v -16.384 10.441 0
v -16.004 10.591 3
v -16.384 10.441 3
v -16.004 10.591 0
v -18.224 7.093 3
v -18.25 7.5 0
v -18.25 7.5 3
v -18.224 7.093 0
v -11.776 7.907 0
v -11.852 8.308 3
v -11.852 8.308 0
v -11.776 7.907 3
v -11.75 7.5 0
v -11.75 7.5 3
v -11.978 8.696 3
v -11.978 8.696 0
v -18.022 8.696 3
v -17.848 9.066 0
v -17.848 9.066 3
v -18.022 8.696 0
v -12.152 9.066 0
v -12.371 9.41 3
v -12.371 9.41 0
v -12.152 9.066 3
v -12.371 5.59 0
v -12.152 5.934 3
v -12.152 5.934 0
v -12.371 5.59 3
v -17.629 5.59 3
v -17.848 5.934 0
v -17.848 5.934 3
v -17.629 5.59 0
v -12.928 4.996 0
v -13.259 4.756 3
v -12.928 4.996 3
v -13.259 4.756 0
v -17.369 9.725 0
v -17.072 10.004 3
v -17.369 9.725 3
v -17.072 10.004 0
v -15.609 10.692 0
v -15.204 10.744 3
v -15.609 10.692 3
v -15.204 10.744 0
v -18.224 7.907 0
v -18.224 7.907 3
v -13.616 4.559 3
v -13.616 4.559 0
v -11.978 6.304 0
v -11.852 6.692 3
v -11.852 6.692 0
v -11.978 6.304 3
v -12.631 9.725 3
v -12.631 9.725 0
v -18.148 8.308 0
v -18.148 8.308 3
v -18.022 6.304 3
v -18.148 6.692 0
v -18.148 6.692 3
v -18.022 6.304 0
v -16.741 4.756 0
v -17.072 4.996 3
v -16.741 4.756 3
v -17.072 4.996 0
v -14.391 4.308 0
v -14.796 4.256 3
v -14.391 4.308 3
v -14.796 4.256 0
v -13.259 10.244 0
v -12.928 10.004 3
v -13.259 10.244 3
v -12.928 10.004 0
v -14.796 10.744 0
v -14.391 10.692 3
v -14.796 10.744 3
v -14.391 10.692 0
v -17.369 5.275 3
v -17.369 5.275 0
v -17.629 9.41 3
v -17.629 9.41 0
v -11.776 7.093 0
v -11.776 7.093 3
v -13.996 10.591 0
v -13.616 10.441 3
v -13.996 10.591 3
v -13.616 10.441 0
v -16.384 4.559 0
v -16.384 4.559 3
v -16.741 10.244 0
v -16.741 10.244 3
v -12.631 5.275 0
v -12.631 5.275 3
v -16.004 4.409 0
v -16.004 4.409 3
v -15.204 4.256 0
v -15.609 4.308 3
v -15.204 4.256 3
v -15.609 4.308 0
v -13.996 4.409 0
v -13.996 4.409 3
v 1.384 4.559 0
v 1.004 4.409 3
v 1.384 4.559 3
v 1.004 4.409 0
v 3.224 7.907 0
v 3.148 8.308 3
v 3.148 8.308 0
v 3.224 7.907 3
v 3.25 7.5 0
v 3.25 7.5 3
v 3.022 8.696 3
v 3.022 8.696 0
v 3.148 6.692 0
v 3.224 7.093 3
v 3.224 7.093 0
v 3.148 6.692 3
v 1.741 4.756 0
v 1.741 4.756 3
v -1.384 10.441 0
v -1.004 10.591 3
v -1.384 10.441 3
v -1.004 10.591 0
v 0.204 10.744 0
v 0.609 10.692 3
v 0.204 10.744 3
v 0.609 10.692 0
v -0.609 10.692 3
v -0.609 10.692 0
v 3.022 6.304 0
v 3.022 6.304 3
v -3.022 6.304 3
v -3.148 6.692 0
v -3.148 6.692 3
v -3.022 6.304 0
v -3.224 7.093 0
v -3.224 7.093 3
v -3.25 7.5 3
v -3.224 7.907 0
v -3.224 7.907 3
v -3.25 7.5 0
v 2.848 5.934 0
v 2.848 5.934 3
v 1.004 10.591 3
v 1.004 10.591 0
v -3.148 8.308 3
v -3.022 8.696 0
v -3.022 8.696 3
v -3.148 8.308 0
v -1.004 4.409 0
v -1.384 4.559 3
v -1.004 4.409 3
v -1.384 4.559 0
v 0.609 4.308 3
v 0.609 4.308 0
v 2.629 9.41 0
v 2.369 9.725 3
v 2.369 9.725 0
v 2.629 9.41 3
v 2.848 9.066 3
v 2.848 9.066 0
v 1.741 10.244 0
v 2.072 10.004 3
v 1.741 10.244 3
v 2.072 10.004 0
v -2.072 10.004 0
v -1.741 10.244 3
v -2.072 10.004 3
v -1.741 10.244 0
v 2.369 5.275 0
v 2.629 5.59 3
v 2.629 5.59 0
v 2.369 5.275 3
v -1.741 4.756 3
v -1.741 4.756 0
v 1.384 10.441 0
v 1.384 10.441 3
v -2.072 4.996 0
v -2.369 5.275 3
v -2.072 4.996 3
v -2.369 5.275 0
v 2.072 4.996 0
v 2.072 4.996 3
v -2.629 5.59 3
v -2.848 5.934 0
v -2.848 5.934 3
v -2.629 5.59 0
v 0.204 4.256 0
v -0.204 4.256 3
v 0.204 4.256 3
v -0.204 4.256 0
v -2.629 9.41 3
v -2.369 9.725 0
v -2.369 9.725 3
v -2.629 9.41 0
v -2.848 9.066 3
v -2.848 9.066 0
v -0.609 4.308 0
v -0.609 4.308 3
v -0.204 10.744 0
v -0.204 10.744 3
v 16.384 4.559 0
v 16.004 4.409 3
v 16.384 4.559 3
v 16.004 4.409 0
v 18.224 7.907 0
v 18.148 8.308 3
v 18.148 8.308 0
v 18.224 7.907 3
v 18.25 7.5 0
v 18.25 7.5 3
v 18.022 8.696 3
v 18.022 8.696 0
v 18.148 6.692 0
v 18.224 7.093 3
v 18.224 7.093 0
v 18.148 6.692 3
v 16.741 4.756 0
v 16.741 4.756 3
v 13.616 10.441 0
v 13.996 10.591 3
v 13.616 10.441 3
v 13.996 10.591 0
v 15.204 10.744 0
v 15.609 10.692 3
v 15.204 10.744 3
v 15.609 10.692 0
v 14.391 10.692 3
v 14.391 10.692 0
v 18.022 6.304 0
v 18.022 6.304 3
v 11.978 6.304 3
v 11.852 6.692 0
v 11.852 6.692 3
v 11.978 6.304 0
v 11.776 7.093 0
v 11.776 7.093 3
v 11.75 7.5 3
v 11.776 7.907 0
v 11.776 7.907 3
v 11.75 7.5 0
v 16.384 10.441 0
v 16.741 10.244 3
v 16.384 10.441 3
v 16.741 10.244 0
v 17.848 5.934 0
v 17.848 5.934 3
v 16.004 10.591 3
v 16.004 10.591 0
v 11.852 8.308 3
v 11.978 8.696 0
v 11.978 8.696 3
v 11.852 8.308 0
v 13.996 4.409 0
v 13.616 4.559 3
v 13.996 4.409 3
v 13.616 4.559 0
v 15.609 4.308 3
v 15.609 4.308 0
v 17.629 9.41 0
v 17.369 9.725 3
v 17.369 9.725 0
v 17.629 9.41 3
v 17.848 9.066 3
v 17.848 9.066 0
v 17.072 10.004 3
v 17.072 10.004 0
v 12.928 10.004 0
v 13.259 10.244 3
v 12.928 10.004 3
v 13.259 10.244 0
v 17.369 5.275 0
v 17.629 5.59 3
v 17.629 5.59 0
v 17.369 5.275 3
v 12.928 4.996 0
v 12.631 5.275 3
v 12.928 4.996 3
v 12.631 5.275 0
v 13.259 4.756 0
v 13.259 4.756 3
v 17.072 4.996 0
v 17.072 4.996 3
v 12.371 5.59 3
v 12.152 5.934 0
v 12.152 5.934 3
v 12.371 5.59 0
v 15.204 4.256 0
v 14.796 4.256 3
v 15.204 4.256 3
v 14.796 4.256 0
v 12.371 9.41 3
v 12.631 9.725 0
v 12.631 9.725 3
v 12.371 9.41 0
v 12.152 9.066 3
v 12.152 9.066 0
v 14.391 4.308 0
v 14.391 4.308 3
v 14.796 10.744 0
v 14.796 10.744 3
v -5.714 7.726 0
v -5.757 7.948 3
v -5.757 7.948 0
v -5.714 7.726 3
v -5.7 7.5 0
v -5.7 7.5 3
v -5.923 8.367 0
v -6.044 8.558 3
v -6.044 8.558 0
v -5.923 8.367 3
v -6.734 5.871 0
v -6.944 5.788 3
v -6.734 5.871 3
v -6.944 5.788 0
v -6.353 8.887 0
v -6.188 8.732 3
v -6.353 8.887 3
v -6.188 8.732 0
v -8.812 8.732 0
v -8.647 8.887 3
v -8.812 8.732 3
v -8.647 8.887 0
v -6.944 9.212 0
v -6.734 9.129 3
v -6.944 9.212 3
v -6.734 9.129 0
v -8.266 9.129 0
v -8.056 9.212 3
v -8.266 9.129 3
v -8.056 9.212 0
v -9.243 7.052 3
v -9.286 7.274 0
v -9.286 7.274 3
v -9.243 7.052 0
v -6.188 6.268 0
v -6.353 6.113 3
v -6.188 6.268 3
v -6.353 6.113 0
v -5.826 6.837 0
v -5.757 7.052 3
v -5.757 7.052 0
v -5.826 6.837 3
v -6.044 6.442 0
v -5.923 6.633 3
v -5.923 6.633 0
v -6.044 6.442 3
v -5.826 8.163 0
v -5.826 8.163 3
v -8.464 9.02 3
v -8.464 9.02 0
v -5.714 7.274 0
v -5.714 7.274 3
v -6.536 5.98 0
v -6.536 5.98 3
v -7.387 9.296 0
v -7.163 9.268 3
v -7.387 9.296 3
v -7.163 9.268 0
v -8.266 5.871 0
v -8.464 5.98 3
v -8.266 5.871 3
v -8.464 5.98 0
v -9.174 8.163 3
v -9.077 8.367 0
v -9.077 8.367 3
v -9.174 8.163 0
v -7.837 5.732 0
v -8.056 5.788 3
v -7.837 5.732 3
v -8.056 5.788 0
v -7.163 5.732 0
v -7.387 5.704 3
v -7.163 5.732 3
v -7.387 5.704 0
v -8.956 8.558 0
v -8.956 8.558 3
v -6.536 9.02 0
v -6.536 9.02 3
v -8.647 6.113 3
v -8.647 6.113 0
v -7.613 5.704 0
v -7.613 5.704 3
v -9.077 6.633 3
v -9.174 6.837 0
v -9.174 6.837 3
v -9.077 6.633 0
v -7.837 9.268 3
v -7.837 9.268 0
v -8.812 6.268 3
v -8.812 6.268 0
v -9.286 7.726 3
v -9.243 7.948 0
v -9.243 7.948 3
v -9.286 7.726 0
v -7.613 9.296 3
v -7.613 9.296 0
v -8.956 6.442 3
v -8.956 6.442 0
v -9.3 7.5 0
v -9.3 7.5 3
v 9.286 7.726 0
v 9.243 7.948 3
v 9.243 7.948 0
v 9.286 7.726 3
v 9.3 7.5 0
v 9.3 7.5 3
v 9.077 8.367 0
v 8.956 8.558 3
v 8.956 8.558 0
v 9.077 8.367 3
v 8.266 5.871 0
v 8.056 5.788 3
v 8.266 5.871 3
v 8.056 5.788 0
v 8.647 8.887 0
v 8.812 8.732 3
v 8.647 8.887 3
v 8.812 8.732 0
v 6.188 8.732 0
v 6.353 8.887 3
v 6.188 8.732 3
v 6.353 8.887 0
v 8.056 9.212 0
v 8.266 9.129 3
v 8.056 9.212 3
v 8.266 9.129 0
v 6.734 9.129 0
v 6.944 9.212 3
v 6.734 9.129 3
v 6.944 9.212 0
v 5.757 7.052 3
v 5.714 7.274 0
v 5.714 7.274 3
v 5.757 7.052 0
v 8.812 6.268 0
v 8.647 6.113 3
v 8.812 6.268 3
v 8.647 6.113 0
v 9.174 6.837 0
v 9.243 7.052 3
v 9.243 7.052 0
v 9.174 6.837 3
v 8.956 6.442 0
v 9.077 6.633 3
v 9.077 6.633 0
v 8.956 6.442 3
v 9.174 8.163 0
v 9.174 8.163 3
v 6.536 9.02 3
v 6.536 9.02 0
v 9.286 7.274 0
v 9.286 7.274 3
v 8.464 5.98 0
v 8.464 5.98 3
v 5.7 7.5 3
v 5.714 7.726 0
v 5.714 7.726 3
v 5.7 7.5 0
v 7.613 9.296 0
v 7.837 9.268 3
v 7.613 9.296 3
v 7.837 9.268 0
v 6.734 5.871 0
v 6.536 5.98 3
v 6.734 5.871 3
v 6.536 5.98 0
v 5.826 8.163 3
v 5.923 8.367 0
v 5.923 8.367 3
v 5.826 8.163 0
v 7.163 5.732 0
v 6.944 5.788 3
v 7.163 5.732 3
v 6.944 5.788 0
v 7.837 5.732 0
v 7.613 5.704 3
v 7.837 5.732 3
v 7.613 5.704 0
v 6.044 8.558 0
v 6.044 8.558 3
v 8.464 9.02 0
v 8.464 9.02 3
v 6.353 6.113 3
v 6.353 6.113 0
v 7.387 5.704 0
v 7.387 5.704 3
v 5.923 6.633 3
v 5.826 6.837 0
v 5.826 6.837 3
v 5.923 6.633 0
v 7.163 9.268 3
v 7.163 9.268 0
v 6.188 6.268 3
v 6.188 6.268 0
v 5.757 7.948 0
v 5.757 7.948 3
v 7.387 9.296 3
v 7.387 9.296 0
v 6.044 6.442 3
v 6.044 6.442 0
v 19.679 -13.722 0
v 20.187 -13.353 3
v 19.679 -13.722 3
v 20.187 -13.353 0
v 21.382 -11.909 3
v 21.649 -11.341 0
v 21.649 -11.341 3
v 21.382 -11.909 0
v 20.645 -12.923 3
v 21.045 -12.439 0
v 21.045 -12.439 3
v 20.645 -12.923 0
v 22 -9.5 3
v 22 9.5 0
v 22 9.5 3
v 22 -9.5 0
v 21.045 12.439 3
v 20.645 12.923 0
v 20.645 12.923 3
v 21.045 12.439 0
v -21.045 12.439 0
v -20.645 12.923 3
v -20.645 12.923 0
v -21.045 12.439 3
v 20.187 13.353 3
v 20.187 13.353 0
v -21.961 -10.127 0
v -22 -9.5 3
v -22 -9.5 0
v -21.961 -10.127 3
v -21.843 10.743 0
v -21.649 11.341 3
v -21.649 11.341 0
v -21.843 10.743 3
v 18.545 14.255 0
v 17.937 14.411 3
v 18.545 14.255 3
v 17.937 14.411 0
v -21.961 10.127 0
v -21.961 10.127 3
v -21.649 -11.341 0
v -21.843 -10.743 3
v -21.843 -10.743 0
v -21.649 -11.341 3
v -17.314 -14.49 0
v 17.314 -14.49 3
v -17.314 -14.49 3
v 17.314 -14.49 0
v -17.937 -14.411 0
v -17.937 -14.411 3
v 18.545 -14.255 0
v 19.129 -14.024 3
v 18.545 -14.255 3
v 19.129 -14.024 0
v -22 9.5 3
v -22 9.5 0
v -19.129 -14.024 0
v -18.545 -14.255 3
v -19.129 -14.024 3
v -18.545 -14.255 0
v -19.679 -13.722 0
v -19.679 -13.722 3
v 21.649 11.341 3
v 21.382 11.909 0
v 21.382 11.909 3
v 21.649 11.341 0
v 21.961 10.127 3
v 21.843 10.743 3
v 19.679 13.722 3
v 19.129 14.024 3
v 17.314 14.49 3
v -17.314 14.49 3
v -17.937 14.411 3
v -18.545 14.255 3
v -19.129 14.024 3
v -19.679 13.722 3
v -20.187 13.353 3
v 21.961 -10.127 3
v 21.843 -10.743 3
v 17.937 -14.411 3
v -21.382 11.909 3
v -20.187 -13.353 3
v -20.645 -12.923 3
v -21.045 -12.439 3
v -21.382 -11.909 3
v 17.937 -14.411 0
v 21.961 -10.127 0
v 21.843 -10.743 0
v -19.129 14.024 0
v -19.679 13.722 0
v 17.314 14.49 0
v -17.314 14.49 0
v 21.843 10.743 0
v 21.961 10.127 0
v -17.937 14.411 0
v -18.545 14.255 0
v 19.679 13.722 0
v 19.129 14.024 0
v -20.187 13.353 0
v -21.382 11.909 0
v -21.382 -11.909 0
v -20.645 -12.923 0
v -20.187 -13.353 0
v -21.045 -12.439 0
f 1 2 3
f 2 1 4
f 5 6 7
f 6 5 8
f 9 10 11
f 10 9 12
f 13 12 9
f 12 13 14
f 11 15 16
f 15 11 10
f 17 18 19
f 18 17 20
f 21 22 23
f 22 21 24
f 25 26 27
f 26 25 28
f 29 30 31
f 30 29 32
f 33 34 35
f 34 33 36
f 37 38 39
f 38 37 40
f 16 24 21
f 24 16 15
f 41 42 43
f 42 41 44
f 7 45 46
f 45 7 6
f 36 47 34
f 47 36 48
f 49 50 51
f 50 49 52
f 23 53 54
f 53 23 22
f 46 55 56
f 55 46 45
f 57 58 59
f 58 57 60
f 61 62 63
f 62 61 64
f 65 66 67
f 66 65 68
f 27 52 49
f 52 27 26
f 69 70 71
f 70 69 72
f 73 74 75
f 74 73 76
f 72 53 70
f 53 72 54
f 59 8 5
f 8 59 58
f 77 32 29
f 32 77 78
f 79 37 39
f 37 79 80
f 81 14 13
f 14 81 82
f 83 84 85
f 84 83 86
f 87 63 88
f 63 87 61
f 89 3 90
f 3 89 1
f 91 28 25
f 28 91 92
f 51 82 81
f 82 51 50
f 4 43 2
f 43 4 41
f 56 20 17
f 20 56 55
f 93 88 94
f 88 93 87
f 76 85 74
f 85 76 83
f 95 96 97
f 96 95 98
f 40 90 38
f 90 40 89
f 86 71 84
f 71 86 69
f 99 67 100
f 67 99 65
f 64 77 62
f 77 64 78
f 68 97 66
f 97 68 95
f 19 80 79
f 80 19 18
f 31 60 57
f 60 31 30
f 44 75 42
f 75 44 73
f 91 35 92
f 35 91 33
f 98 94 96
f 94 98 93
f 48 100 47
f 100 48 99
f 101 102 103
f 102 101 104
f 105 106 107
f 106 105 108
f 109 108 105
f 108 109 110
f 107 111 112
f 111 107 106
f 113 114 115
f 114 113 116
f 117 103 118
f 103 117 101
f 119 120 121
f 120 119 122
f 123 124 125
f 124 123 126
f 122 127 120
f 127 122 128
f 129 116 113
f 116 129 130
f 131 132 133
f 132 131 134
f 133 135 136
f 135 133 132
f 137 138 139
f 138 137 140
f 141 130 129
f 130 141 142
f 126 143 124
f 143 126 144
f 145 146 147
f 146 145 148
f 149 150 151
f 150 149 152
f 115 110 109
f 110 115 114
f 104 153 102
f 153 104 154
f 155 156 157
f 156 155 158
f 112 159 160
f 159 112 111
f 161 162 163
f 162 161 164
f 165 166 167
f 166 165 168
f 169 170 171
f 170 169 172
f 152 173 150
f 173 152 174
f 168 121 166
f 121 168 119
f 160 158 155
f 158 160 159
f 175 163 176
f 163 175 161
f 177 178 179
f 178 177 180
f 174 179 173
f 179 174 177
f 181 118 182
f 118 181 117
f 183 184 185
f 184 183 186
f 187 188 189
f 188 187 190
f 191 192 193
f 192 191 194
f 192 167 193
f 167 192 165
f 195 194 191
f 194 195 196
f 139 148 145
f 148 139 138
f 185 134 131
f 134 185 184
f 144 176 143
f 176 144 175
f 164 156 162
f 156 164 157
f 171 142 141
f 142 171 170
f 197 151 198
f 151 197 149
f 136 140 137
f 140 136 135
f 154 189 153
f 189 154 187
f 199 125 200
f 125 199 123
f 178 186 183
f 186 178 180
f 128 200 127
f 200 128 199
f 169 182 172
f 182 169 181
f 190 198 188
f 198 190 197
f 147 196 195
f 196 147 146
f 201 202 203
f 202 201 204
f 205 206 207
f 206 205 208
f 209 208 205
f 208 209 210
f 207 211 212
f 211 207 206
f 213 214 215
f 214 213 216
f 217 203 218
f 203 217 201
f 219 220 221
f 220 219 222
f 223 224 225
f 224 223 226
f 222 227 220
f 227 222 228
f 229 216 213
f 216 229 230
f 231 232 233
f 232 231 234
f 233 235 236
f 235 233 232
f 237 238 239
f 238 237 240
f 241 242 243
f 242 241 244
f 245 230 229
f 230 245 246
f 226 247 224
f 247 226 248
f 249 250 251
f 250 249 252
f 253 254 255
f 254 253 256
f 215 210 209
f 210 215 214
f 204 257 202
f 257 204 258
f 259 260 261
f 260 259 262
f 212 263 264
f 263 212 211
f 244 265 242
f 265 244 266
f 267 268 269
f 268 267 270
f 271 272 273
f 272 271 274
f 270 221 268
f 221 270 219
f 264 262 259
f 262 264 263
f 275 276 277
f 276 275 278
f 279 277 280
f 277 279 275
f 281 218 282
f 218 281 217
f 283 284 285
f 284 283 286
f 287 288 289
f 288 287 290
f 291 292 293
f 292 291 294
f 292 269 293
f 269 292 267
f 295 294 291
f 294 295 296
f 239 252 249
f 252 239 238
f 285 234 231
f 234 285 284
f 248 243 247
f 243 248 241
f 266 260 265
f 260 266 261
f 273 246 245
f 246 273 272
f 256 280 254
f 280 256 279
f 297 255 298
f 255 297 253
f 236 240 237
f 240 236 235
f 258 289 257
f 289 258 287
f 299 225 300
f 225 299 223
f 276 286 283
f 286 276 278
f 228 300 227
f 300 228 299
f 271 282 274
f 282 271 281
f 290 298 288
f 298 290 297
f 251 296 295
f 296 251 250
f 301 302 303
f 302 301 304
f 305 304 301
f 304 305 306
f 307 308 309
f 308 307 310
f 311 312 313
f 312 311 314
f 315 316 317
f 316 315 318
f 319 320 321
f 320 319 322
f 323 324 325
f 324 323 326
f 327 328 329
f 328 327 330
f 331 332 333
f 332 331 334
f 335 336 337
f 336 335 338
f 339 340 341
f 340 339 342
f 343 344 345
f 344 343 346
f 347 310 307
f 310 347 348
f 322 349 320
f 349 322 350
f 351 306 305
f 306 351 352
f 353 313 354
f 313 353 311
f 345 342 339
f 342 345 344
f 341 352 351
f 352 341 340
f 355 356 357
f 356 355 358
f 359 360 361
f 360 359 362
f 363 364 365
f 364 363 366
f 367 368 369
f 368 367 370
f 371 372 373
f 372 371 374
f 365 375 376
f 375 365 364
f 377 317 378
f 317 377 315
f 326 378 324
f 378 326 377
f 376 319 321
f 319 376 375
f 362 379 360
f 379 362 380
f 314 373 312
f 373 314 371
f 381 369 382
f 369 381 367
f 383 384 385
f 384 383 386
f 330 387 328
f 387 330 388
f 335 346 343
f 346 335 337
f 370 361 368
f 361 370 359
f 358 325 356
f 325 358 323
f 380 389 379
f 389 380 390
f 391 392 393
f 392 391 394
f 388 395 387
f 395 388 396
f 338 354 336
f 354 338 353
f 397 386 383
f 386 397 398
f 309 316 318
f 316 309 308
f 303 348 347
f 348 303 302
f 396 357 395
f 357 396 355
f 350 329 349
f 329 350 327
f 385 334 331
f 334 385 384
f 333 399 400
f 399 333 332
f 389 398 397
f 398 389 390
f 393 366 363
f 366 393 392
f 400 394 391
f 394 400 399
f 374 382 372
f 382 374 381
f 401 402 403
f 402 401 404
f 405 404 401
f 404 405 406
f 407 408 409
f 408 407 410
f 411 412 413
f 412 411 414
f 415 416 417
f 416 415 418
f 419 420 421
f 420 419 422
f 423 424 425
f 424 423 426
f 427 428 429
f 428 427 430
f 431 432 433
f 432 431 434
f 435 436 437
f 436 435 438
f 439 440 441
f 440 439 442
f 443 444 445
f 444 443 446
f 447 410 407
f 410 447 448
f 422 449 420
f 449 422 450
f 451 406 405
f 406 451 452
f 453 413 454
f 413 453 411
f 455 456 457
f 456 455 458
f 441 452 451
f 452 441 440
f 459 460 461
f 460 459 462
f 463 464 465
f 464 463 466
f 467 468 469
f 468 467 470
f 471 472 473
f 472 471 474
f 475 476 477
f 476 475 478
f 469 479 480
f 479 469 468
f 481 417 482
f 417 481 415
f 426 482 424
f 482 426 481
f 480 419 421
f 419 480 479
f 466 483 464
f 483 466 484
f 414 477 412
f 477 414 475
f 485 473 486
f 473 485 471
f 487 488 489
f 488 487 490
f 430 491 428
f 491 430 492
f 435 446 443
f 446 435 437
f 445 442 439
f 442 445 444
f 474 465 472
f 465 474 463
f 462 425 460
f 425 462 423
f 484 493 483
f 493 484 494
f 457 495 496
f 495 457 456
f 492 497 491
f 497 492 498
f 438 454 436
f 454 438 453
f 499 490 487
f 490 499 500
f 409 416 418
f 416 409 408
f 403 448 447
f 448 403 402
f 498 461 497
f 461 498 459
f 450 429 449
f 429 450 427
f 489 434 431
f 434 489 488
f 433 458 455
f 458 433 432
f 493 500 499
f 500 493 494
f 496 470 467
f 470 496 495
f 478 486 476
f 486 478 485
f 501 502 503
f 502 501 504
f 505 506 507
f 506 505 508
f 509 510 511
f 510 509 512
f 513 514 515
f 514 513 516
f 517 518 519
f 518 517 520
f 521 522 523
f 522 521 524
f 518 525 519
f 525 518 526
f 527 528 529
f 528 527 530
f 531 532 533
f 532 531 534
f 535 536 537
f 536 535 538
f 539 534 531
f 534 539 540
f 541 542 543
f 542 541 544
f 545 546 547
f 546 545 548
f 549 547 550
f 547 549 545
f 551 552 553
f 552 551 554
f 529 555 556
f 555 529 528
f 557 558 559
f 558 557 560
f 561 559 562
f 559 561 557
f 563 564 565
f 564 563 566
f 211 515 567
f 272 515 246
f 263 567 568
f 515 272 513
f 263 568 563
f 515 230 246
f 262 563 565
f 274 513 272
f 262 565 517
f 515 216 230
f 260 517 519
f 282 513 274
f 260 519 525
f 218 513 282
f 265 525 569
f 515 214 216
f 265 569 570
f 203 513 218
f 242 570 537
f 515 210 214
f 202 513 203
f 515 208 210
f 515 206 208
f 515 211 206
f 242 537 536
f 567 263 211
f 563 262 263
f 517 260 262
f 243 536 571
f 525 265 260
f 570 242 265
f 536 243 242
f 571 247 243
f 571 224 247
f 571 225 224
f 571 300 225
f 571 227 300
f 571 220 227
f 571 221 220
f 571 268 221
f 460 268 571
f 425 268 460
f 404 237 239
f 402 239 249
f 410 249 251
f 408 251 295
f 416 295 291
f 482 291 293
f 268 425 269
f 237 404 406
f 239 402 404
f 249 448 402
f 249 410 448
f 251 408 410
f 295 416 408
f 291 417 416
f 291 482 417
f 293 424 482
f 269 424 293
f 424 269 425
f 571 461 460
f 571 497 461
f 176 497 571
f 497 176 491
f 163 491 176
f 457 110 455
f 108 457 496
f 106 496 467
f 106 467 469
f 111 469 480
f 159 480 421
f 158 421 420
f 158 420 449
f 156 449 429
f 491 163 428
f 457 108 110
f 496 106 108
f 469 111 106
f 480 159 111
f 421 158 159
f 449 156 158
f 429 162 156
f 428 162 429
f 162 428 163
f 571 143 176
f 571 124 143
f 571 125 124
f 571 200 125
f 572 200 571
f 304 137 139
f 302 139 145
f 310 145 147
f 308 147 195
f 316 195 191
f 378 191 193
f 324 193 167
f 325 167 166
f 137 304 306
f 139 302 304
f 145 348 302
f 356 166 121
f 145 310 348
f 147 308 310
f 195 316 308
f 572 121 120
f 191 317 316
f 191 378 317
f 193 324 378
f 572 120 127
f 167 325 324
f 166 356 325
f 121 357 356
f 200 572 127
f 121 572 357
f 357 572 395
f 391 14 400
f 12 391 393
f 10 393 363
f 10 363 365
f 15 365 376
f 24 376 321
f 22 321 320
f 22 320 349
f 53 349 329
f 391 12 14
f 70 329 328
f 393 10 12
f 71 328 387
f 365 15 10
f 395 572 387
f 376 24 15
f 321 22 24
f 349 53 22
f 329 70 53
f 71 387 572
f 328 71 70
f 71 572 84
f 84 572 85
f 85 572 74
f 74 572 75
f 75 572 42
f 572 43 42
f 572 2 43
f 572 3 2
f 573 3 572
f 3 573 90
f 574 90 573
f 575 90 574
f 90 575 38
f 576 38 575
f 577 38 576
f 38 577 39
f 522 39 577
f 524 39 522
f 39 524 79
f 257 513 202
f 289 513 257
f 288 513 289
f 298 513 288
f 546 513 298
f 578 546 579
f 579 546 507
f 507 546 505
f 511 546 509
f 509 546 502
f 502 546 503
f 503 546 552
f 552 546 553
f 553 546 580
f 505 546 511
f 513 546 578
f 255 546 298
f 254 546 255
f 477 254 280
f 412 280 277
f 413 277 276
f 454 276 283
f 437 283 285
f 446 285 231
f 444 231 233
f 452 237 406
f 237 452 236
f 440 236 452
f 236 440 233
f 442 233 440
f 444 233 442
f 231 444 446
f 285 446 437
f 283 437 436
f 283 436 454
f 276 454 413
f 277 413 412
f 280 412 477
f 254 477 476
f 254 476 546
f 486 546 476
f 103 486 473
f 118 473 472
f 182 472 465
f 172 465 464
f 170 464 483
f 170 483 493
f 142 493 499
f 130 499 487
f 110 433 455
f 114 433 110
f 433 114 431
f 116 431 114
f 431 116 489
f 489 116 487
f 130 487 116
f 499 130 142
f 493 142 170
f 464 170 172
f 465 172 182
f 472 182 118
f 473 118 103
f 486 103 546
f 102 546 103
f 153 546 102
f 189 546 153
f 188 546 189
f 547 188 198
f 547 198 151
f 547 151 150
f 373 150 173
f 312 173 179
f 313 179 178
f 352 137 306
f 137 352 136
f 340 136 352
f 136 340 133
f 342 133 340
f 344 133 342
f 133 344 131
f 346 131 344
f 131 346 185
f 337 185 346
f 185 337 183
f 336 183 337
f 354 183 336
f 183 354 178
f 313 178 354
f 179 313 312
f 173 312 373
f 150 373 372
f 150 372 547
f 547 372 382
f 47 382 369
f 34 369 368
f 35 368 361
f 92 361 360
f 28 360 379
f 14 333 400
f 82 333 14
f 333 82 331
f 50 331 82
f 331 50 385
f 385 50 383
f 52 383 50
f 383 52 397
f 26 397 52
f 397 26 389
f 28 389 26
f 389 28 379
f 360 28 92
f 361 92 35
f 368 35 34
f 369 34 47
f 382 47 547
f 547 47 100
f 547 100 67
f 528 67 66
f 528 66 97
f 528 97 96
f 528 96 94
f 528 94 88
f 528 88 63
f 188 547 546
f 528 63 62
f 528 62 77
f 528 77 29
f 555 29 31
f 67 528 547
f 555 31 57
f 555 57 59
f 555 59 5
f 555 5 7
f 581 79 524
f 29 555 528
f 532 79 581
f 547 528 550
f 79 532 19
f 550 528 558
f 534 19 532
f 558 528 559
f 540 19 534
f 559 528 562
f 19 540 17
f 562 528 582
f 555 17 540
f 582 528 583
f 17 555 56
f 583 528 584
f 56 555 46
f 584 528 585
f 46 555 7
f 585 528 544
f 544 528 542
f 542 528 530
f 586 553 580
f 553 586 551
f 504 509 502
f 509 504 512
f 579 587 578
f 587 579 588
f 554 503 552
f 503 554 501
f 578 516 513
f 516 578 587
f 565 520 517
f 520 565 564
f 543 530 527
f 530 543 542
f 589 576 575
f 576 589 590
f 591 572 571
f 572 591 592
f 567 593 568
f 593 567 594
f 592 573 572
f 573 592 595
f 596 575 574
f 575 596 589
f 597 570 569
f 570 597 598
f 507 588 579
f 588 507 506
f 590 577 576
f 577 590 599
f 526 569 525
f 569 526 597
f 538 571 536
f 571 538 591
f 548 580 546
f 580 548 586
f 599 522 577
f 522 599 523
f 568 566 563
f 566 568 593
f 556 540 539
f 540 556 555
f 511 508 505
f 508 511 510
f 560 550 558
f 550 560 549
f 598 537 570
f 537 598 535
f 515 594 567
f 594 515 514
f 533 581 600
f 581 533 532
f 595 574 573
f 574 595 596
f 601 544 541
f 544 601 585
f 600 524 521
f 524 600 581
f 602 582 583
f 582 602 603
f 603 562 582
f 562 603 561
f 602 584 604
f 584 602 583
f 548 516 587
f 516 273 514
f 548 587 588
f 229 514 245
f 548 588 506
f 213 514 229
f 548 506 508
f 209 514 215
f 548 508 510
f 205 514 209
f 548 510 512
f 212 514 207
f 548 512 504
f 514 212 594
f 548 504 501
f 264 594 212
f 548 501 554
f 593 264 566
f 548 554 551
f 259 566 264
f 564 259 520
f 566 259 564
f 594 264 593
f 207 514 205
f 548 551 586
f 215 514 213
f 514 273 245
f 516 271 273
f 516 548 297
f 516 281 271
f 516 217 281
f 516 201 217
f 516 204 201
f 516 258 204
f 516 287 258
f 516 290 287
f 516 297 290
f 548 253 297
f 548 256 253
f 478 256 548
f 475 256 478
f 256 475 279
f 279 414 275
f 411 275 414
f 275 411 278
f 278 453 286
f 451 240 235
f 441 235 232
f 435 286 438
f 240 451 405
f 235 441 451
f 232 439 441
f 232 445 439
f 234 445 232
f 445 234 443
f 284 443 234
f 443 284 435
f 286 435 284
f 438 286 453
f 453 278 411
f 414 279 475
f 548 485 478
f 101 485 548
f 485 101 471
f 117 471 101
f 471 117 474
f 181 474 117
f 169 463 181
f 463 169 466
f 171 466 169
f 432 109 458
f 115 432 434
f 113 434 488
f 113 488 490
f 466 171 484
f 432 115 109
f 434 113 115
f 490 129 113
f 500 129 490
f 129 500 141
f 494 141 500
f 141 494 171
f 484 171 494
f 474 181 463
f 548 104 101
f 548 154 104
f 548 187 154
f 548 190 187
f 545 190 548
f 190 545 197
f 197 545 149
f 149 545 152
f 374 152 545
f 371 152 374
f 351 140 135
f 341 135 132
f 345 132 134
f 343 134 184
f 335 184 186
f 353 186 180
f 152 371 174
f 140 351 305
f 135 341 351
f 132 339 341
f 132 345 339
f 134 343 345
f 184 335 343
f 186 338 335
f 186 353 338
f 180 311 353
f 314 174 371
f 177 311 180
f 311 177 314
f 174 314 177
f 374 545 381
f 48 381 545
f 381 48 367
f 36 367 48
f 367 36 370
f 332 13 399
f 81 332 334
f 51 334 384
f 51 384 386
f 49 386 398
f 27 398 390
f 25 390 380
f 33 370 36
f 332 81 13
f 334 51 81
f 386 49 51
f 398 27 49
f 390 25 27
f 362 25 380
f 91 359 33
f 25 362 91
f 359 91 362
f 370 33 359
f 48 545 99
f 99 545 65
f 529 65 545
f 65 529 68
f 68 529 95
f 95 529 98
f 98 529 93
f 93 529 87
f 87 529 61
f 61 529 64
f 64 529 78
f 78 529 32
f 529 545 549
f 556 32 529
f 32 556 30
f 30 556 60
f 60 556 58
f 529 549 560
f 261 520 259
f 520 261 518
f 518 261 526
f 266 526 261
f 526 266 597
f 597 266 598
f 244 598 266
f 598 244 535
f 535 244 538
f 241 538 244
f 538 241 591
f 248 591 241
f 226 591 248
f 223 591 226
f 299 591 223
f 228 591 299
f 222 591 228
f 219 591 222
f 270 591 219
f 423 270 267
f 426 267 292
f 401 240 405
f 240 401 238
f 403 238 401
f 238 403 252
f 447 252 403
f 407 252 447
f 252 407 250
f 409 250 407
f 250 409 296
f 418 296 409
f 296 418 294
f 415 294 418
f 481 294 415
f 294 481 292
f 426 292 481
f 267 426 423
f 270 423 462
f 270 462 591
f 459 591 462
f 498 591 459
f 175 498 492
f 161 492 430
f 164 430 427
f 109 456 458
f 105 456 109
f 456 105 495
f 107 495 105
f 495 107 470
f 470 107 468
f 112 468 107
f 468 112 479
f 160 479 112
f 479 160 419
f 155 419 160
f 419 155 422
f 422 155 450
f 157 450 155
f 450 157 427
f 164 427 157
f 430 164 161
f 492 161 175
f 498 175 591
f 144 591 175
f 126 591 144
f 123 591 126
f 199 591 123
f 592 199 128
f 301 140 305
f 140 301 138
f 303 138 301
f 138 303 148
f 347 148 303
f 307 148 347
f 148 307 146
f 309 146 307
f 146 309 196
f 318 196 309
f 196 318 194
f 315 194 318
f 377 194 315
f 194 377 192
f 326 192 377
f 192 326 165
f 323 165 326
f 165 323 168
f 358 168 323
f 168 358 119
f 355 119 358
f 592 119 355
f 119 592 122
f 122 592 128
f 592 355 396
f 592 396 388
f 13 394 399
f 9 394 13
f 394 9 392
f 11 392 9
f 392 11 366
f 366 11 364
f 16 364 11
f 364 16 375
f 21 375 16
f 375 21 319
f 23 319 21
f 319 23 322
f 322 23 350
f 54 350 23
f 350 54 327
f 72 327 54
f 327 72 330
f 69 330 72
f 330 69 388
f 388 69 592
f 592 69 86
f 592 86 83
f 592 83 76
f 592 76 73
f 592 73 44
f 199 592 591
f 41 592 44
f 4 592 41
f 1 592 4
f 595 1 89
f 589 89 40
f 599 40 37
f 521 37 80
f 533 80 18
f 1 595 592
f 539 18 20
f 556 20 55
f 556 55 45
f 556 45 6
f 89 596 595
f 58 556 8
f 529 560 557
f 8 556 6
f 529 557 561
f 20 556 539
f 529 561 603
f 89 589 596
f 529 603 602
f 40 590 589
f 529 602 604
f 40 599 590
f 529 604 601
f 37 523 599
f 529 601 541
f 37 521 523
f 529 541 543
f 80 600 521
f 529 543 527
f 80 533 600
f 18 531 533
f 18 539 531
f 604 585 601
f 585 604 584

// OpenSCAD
$fn = 50;


difference() {
	union() {
		*color(alpha = 1.0000000000, c = "gray") {
			translate(v = [0, 7, 0]) {
				linear_extrude(height = 1) {
					text(font = "Arial:style=Bold", halign = "center", size = 4.5000000000, text = "COMMENT plate main", valign = "center");
				}
			}
		}
		hull() {
			translate(v = [-17.0000000000, 9.5000000000, 0]) {
				cylinder(h = 3, r = 5);
			}
			translate(v = [17.0000000000, 9.5000000000, 0]) {
				cylinder(h = 3, r = 5);
			}
			translate(v = [-17.0000000000, -9.5000000000, 0]) {
				cylinder(h = 3, r = 5);
			}
			translate(v = [17.0000000000, -9.5000000000, 0]) {
				cylinder(h = 3, r = 5);
			}
		}
	}
	union() {
		*color(alpha = 1.0000000000, c = "gray") {
			translate(v = [0, 7, 0]) {
				linear_extrude(height = 1) {
					text(font = "Arial:style=Bold", halign = "center", size = 4.5000000000, text = "COMMENT holes main", valign = "center");
				}
			}
		}
		translate(v = [-15.0000000000, 7.5000000000, -100.0000000000]) {
			cylinder(h = 200, r = 3.2500000000);
		}
		translate(v = [0.0000000000, 7.5000000000, -100.0000000000]) {
			cylinder(h = 200, r = 3.2500000000);
		}
		translate(v = [15.0000000000, 7.5000000000, -100.0000000000]) {
			cylinder(h = 200, r = 3.2500000000);
		}
		translate(v = [-15.0000000000, 7.5000000000, -100.0000000000]) {
			cylinder(h = 200, r = 1.8000000000);
		}
		translate(v = [-7.5000000000, 7.5000000000, -100.0000000000]) {
			cylinder(h = 200, r = 1.8000000000);
		}
		translate(v = [0.0000000000, 7.5000000000, -100.0000000000]) {
			cylinder(h = 200, r = 1.8000000000);
		}
		translate(v = [7.5000000000, 7.5000000000, -100.0000000000]) {
			cylinder(h = 200, r = 1.8000000000);
		}
		translate(v = [15.0000000000, 7.5000000000, -100.0000000000]) {
			cylinder(h = 200, r = 1.8000000000);
		}
		translate(v = [-15.0000000000, 7.5000000000, -100.0000000000]) {
			cylinder(h = 200, r = 1.8000000000);
		}
		translate(v = [-7.5000000000, 7.5000000000, -100.0000000000]) {
			cylinder(h = 200, r = 1.8000000000);
		}
		translate(v = [0.0000000000, 7.5000000000, -100.0000000000]) {
			cylinder(h = 200, r = 1.8000000000);
		}
		translate(v = [7.5000000000, 7.5000000000, -100.0000000000]) {
			cylinder(h = 200, r = 1.8000000000);
		}
		translate(v = [15.0000000000, 7.5000000000, -100.0000000000]) {
			cylinder(h = 200, r = 1.8000000000);
		}
		translate(v = [-15.0000000000, 7.5000000000, -100.0000000000]) {
			cylinder(h = 200, r = 1.8000000000);
		}
		translate(v = [-7.5000000000, 7.5000000000, -100.0000000000]) {
			cylinder(h = 200, r = 1.8000000000);
		}
		translate(v = [0.0000000000, 7.5000000000, -100.0000000000]) {
			cylinder(h = 200, r = 1.8000000000);
		}
		translate(v = [7.5000000000, 7.5000000000, -100.0000000000]) {
			cylinder(h = 200, r = 1.8000000000);
		}
		translate(v = [15.0000000000, 7.5000000000, -100.0000000000]) {
			cylinder(h = 200, r = 1.8000000000);
		}
	}
}
